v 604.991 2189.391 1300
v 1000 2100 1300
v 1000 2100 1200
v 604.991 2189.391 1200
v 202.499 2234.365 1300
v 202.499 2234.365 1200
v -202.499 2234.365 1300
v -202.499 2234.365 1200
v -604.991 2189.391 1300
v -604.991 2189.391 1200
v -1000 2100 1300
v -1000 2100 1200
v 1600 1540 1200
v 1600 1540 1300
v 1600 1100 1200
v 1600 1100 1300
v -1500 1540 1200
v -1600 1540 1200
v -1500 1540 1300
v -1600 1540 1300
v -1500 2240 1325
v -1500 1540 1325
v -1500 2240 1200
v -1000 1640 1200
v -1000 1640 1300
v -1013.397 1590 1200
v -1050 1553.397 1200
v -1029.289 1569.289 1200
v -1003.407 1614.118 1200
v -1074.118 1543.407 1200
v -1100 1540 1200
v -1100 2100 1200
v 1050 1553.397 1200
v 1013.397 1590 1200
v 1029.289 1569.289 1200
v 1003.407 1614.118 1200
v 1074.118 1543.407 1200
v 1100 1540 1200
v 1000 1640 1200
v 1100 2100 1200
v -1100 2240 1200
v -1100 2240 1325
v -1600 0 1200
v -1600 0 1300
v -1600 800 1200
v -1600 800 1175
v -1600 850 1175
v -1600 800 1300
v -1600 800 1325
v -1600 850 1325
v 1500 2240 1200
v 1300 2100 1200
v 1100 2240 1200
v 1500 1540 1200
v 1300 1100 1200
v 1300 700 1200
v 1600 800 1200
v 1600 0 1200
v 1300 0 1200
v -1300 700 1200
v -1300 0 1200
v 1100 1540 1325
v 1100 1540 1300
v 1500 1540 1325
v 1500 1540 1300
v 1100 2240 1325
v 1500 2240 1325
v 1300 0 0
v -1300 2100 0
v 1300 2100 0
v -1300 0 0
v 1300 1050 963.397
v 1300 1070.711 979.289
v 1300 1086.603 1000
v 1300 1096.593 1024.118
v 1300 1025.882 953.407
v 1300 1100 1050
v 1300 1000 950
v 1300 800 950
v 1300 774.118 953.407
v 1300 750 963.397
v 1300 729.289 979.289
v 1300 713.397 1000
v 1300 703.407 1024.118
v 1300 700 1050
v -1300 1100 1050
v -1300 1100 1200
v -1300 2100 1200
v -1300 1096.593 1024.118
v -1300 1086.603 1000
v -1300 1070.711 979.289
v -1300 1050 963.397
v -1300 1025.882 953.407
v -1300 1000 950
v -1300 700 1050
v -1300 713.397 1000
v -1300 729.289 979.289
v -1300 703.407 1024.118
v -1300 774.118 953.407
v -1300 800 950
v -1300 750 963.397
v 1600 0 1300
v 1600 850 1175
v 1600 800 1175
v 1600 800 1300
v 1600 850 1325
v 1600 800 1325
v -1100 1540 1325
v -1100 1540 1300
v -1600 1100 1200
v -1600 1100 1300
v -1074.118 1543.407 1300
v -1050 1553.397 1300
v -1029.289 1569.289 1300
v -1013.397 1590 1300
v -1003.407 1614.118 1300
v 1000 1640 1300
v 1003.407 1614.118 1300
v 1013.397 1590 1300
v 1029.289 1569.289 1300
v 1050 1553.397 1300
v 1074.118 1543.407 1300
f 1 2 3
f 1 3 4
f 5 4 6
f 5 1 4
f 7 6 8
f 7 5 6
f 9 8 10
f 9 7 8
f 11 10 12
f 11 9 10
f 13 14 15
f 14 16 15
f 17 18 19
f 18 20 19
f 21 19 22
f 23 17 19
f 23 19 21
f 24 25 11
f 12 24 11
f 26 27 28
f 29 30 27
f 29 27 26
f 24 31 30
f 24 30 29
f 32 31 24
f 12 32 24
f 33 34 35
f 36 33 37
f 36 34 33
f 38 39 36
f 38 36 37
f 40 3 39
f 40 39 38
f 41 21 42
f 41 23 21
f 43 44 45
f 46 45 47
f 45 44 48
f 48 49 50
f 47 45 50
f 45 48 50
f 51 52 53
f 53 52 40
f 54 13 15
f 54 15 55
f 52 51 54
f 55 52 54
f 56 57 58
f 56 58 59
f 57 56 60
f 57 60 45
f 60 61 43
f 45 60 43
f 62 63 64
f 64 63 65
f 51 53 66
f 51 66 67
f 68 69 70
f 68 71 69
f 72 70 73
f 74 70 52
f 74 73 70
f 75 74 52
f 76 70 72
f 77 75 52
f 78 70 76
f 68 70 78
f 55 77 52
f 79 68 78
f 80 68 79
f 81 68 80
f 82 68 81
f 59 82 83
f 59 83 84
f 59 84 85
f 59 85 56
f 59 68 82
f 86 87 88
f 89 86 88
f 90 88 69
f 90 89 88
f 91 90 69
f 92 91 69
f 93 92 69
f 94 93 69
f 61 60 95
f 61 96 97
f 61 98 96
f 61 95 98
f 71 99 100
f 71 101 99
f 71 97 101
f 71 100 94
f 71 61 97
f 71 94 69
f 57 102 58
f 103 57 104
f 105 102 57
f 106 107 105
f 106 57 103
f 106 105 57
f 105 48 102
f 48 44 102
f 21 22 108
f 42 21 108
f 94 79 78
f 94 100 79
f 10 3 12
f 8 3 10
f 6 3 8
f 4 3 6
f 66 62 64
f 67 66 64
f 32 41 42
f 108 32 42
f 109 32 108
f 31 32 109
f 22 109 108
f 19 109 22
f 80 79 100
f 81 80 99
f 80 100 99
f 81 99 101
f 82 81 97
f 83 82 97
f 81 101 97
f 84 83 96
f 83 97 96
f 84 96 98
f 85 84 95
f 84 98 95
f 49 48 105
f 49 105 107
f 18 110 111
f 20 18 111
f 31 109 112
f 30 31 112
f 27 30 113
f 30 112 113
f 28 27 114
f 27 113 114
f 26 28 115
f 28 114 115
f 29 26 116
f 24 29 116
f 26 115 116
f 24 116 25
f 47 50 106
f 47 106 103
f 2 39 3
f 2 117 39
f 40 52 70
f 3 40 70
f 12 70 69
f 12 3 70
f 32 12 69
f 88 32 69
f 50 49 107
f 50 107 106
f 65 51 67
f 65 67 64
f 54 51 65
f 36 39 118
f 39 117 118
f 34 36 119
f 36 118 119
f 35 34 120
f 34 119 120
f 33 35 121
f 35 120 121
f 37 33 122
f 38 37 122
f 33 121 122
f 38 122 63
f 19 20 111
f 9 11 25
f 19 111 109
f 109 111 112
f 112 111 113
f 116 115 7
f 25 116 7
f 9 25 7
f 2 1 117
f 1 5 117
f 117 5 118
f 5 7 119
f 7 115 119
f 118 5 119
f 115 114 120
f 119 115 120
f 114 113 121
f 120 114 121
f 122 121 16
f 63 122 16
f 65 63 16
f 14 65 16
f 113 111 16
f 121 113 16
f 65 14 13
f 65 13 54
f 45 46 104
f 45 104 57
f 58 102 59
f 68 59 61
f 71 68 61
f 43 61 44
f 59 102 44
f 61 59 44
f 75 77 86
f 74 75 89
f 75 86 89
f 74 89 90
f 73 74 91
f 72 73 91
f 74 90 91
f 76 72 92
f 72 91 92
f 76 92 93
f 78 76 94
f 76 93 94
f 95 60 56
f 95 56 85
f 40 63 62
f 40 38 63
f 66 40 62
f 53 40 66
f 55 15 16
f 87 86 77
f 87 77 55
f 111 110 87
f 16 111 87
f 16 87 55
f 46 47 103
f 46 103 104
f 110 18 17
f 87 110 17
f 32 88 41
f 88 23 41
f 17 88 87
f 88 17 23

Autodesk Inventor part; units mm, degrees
ref_plane "YZ Plane" through (0, 0, 0) normal (1, 0, 0) x (0, 1, 0)
ref_plane "XZ Plane" through (0, 0, 0) normal (0, 1, 0) x (-1, 0, 0)
ref_plane "XY Plane" through (0, 0, 0) normal (0, 0, 1) x (1, 0, 0)
sketch "Sketch1" plane through (0, 0, 0) normal (0, 1, 0) x (-1, 0, 0)
  line L0 (1300, 0) -> (-1300, 0)
  line L1 (-1300, 0) -> (-1300, 1200)
  line L2 (-1300, 1200) -> (1300, 1200)
  line L3 (1300, 1200) -> (1300, 0)
  line L4 (1300, 0) -> (-1300, 1200) construction
  line L5 (-1300, 0) -> (1300, 1200) construction
  point P0 (0, 0)
  point P1 (0, 600)
  point P2 (0, 0)
  dimension "d0" = 2600
  dimension "d19" = 1200
extrude "Extrusion1" add sketch "Sketch1" along normal blind 2100
sketch "Sketch5" plane through (0, 0, 0) normal (0, 1, 0) x (-1, 0, 0)
  line L0 (-1600, 1200) -> (1600, 1200)
  line L1 (1600, 1200) -> (1600, 1300)
  line L2 (1600, 1300) -> (-1600, 1300)
  line L3 (-1600, 1300) -> (-1600, 1200)
  line L4 (-1600, 1200) -> (1600, 1300) construction
  line L5 (1600, 1200) -> (-1600, 1300) construction
  line L6 (1300, 1200) -> (-1300, 1200) projected
  point P0 (0, 0)
  point P1 (0, 1250)
  point P2 (0, 1200)
  dimension "d20" = 100
  dimension "d21" = 3200
extrude "Extrusion5" add sketch "Sketch5" along normal blind 2240
sketch "Sketch6" plane through (-1600, 0, 1300) normal (0, 0, 1) x (1, 0, 0)
  line L0 (2900, 0) -> (300, 0) projected
  line L1 (300, 0) -> (300, 2100) projected
  line L2 (2900, 2100) -> (300, 2100) projected
  line L3 (2900, 0) -> (2900, 2100) projected
  line L4 (0, 0) -> (0, 2240) projected
  line L5 (0, 1540) -> (300, 1540)
  line L6 (300, 0) -> (300, 2100) projected
  line L7 (300, 1540) -> (500, 1540)
  arc A0 (500, 1540) -> (600, 1640) centre (500, 1640) ccw
  line L8 (600, 1640) -> (600, 2100)
  line L9 (300, 2100) -> (2900, 2100) projected
  line L10 (1600, 2100) -> (1600, -35.8904) construction
  line L11 (3200, 1540) -> (2900, 1540)
  line L12 (2900, 1540) -> (2700, 1540)
  arc A1 (2600, 1640) -> (2700, 1540) centre (2700, 1640) ccw
  line L13 (2600, 1640) -> (2600, 2100)
  line L14 (0, 2240) -> (3200, 2240) projected
  arc A2 (2600, 2100) -> (600, 2100) centre (1600, -1401.4286) ccw
  line L15 (2900, 0) -> (2900, 2100) projected
  line L16 (3200, 0) -> (3200, 2240) projected
  line L17 (3200, 0) -> (3200, 2240) projected
  point P0 (1600, 0)
  point P1 (1600, 2240)
  dimension "d24" = 700
  dimension "d25" = 600
  dimension "d26" = 100
extrude "Extrusion6" cut sketch "Sketch6" against normal up to surface (100 mm away) contours L12 A1 L13 L2 L3 | L3 L2 A2 L14 L16 L11 | L5 L4 L14 A2 L2 L1 | L1 L2 L8 A0 L7
sketch "Sketch7" plane through (0, 0, 0) normal (1, 0, 0) x (0, 1, 0)
  line L0 (0, 1300) -> (1540, 1300) projected
  line L1 (0, 0) -> (0, 1200) projected
  line L2 (2100, 0) -> (2100, 1200) projected
  line L3 (0, 1200) -> (1540, 1200) projected
  line L4 (800, 1300) -> (800, 1200)
  line L5 (0, 1200) -> (1540, 1200) projected
  line L6 (700, 1200) -> (700, 1050)
  arc A0 (700, 1050) -> (800, 950) centre (800, 1050) ccw
  line L7 (800, 950) -> (1000, 950)
  arc A1 (1000, 950) -> (1100, 1050) centre (1000, 1050) ccw
  line L8 (1100, 1050) -> (1100, 1300)
  dimension "d30" = 100
  dimension "d31" = 350
  dimension "d32" = 100
  dimension "d33" = 800
  dimension "d34" = 400
extrude "Extrusion7" cut sketch "Sketch7" along normal through all both and the other way through all
sketch "Sketch8" plane through (0, 0, 0) normal (1, 0, 0) x (0, 1, 0)
  line L0 (800, 1300) -> (800, 1200) projected
  line L1 (0, 1200) -> (800, 1200) projected
  line L2 (0, 1200) -> (0, 1300) projected
  line L3 (0, 1300) -> (800, 1300) projected
  line L4 (850, 1175) -> (800, 1175)
  line L5 (800, 1175) -> (800, 1325)
  line L6 (800, 1325) -> (850, 1325)
  line L7 (850, 1325) -> (850, 1175)
  line L8 (850, 1175) -> (800, 1325) construction
  line L9 (800, 1175) -> (850, 1325) construction
  line L10 (800, 1300) -> (800, 1200) projected
  point P0 (0, 0)
  point P1 (825, 1250)
  point P2 (800, 1250)
  dimension "d37" = 150
  dimension "d38" = 50
extrude "Extrusion8" add sketch "Sketch8" along normal mid plane 3200 contours L5 L6 L7 L4 L0
sketch "Sketch9" plane through (-1300, 2100, 1200) normal (0, 0, 1) x (1, 0, 0)
  line L0 (0, -560) -> (0, 0) projected
  line L1 (0, -560) -> (200, -560) projected
  arc A0 (200, -560) -> (300, -460) centre (200, -460) ccw projected
  line L2 (300, -460) -> (300, 0) projected
  line L3 (0, 0) -> (300, 0) projected
  line L4 (2600, -560) -> (2600, 0) projected
  line L5 (2300, 0) -> (2600, 0) projected
  line L6 (2300, 0) -> (2300, -460) projected
  arc A1 (2300, -460) -> (2400, -560) centre (2400, -460) ccw projected
  line L7 (2400, -560) -> (2600, -560) projected
  line L8 (0, -560) -> (200, -560) projected
  line L9 (-200, 140) -> (200, 140)
  line L10 (200, 140) -> (200, -560)
  line L11 (200, -560) -> (-200, -560)
  line L12 (-200, -560) -> (-200, 140)
  line L13 (0, -2100) -> (0, 0) projected
  line L14 (-200, 140) -> (200, -560) construction
  line L15 (200, 140) -> (-200, -560) construction
  line L16 (2400, 140) -> (2800, 140)
  line L17 (2800, 140) -> (2800, -560)
  line L18 (2800, -560) -> (2400, -560)
  line L19 (2400, -560) -> (2400, 140)
  line L20 (2600, -560) -> (2600, 0) projected
  line L21 (2400, 140) -> (2800, -560) construction
  line L22 (2800, 140) -> (2400, -560) construction
  line L23 (-300, -2100) -> (2900, -2100) projected
  point P0 (1300, -2100)
  point P1 (0, -210)
  point P2 (2600, -210)
  point P3 (200, -560)
  dimension "d41" = 400
  dimension "d42" = 2240
extrude "Extrusion9" add sketch "Sketch9" along normal up to surface (125 mm away) contours L11 L12 L9 L10 L3 L0 | L0 L3 L10 L1 | L7 L19 L5 L4 | L4 L5 L19 L16 L17 L18
equation "\"d39\" = d21"
equation "\"d43\" = d21"
properties part number "Hydraulic Sheet Metal Bending Machine PBH-135T3200 3000"
